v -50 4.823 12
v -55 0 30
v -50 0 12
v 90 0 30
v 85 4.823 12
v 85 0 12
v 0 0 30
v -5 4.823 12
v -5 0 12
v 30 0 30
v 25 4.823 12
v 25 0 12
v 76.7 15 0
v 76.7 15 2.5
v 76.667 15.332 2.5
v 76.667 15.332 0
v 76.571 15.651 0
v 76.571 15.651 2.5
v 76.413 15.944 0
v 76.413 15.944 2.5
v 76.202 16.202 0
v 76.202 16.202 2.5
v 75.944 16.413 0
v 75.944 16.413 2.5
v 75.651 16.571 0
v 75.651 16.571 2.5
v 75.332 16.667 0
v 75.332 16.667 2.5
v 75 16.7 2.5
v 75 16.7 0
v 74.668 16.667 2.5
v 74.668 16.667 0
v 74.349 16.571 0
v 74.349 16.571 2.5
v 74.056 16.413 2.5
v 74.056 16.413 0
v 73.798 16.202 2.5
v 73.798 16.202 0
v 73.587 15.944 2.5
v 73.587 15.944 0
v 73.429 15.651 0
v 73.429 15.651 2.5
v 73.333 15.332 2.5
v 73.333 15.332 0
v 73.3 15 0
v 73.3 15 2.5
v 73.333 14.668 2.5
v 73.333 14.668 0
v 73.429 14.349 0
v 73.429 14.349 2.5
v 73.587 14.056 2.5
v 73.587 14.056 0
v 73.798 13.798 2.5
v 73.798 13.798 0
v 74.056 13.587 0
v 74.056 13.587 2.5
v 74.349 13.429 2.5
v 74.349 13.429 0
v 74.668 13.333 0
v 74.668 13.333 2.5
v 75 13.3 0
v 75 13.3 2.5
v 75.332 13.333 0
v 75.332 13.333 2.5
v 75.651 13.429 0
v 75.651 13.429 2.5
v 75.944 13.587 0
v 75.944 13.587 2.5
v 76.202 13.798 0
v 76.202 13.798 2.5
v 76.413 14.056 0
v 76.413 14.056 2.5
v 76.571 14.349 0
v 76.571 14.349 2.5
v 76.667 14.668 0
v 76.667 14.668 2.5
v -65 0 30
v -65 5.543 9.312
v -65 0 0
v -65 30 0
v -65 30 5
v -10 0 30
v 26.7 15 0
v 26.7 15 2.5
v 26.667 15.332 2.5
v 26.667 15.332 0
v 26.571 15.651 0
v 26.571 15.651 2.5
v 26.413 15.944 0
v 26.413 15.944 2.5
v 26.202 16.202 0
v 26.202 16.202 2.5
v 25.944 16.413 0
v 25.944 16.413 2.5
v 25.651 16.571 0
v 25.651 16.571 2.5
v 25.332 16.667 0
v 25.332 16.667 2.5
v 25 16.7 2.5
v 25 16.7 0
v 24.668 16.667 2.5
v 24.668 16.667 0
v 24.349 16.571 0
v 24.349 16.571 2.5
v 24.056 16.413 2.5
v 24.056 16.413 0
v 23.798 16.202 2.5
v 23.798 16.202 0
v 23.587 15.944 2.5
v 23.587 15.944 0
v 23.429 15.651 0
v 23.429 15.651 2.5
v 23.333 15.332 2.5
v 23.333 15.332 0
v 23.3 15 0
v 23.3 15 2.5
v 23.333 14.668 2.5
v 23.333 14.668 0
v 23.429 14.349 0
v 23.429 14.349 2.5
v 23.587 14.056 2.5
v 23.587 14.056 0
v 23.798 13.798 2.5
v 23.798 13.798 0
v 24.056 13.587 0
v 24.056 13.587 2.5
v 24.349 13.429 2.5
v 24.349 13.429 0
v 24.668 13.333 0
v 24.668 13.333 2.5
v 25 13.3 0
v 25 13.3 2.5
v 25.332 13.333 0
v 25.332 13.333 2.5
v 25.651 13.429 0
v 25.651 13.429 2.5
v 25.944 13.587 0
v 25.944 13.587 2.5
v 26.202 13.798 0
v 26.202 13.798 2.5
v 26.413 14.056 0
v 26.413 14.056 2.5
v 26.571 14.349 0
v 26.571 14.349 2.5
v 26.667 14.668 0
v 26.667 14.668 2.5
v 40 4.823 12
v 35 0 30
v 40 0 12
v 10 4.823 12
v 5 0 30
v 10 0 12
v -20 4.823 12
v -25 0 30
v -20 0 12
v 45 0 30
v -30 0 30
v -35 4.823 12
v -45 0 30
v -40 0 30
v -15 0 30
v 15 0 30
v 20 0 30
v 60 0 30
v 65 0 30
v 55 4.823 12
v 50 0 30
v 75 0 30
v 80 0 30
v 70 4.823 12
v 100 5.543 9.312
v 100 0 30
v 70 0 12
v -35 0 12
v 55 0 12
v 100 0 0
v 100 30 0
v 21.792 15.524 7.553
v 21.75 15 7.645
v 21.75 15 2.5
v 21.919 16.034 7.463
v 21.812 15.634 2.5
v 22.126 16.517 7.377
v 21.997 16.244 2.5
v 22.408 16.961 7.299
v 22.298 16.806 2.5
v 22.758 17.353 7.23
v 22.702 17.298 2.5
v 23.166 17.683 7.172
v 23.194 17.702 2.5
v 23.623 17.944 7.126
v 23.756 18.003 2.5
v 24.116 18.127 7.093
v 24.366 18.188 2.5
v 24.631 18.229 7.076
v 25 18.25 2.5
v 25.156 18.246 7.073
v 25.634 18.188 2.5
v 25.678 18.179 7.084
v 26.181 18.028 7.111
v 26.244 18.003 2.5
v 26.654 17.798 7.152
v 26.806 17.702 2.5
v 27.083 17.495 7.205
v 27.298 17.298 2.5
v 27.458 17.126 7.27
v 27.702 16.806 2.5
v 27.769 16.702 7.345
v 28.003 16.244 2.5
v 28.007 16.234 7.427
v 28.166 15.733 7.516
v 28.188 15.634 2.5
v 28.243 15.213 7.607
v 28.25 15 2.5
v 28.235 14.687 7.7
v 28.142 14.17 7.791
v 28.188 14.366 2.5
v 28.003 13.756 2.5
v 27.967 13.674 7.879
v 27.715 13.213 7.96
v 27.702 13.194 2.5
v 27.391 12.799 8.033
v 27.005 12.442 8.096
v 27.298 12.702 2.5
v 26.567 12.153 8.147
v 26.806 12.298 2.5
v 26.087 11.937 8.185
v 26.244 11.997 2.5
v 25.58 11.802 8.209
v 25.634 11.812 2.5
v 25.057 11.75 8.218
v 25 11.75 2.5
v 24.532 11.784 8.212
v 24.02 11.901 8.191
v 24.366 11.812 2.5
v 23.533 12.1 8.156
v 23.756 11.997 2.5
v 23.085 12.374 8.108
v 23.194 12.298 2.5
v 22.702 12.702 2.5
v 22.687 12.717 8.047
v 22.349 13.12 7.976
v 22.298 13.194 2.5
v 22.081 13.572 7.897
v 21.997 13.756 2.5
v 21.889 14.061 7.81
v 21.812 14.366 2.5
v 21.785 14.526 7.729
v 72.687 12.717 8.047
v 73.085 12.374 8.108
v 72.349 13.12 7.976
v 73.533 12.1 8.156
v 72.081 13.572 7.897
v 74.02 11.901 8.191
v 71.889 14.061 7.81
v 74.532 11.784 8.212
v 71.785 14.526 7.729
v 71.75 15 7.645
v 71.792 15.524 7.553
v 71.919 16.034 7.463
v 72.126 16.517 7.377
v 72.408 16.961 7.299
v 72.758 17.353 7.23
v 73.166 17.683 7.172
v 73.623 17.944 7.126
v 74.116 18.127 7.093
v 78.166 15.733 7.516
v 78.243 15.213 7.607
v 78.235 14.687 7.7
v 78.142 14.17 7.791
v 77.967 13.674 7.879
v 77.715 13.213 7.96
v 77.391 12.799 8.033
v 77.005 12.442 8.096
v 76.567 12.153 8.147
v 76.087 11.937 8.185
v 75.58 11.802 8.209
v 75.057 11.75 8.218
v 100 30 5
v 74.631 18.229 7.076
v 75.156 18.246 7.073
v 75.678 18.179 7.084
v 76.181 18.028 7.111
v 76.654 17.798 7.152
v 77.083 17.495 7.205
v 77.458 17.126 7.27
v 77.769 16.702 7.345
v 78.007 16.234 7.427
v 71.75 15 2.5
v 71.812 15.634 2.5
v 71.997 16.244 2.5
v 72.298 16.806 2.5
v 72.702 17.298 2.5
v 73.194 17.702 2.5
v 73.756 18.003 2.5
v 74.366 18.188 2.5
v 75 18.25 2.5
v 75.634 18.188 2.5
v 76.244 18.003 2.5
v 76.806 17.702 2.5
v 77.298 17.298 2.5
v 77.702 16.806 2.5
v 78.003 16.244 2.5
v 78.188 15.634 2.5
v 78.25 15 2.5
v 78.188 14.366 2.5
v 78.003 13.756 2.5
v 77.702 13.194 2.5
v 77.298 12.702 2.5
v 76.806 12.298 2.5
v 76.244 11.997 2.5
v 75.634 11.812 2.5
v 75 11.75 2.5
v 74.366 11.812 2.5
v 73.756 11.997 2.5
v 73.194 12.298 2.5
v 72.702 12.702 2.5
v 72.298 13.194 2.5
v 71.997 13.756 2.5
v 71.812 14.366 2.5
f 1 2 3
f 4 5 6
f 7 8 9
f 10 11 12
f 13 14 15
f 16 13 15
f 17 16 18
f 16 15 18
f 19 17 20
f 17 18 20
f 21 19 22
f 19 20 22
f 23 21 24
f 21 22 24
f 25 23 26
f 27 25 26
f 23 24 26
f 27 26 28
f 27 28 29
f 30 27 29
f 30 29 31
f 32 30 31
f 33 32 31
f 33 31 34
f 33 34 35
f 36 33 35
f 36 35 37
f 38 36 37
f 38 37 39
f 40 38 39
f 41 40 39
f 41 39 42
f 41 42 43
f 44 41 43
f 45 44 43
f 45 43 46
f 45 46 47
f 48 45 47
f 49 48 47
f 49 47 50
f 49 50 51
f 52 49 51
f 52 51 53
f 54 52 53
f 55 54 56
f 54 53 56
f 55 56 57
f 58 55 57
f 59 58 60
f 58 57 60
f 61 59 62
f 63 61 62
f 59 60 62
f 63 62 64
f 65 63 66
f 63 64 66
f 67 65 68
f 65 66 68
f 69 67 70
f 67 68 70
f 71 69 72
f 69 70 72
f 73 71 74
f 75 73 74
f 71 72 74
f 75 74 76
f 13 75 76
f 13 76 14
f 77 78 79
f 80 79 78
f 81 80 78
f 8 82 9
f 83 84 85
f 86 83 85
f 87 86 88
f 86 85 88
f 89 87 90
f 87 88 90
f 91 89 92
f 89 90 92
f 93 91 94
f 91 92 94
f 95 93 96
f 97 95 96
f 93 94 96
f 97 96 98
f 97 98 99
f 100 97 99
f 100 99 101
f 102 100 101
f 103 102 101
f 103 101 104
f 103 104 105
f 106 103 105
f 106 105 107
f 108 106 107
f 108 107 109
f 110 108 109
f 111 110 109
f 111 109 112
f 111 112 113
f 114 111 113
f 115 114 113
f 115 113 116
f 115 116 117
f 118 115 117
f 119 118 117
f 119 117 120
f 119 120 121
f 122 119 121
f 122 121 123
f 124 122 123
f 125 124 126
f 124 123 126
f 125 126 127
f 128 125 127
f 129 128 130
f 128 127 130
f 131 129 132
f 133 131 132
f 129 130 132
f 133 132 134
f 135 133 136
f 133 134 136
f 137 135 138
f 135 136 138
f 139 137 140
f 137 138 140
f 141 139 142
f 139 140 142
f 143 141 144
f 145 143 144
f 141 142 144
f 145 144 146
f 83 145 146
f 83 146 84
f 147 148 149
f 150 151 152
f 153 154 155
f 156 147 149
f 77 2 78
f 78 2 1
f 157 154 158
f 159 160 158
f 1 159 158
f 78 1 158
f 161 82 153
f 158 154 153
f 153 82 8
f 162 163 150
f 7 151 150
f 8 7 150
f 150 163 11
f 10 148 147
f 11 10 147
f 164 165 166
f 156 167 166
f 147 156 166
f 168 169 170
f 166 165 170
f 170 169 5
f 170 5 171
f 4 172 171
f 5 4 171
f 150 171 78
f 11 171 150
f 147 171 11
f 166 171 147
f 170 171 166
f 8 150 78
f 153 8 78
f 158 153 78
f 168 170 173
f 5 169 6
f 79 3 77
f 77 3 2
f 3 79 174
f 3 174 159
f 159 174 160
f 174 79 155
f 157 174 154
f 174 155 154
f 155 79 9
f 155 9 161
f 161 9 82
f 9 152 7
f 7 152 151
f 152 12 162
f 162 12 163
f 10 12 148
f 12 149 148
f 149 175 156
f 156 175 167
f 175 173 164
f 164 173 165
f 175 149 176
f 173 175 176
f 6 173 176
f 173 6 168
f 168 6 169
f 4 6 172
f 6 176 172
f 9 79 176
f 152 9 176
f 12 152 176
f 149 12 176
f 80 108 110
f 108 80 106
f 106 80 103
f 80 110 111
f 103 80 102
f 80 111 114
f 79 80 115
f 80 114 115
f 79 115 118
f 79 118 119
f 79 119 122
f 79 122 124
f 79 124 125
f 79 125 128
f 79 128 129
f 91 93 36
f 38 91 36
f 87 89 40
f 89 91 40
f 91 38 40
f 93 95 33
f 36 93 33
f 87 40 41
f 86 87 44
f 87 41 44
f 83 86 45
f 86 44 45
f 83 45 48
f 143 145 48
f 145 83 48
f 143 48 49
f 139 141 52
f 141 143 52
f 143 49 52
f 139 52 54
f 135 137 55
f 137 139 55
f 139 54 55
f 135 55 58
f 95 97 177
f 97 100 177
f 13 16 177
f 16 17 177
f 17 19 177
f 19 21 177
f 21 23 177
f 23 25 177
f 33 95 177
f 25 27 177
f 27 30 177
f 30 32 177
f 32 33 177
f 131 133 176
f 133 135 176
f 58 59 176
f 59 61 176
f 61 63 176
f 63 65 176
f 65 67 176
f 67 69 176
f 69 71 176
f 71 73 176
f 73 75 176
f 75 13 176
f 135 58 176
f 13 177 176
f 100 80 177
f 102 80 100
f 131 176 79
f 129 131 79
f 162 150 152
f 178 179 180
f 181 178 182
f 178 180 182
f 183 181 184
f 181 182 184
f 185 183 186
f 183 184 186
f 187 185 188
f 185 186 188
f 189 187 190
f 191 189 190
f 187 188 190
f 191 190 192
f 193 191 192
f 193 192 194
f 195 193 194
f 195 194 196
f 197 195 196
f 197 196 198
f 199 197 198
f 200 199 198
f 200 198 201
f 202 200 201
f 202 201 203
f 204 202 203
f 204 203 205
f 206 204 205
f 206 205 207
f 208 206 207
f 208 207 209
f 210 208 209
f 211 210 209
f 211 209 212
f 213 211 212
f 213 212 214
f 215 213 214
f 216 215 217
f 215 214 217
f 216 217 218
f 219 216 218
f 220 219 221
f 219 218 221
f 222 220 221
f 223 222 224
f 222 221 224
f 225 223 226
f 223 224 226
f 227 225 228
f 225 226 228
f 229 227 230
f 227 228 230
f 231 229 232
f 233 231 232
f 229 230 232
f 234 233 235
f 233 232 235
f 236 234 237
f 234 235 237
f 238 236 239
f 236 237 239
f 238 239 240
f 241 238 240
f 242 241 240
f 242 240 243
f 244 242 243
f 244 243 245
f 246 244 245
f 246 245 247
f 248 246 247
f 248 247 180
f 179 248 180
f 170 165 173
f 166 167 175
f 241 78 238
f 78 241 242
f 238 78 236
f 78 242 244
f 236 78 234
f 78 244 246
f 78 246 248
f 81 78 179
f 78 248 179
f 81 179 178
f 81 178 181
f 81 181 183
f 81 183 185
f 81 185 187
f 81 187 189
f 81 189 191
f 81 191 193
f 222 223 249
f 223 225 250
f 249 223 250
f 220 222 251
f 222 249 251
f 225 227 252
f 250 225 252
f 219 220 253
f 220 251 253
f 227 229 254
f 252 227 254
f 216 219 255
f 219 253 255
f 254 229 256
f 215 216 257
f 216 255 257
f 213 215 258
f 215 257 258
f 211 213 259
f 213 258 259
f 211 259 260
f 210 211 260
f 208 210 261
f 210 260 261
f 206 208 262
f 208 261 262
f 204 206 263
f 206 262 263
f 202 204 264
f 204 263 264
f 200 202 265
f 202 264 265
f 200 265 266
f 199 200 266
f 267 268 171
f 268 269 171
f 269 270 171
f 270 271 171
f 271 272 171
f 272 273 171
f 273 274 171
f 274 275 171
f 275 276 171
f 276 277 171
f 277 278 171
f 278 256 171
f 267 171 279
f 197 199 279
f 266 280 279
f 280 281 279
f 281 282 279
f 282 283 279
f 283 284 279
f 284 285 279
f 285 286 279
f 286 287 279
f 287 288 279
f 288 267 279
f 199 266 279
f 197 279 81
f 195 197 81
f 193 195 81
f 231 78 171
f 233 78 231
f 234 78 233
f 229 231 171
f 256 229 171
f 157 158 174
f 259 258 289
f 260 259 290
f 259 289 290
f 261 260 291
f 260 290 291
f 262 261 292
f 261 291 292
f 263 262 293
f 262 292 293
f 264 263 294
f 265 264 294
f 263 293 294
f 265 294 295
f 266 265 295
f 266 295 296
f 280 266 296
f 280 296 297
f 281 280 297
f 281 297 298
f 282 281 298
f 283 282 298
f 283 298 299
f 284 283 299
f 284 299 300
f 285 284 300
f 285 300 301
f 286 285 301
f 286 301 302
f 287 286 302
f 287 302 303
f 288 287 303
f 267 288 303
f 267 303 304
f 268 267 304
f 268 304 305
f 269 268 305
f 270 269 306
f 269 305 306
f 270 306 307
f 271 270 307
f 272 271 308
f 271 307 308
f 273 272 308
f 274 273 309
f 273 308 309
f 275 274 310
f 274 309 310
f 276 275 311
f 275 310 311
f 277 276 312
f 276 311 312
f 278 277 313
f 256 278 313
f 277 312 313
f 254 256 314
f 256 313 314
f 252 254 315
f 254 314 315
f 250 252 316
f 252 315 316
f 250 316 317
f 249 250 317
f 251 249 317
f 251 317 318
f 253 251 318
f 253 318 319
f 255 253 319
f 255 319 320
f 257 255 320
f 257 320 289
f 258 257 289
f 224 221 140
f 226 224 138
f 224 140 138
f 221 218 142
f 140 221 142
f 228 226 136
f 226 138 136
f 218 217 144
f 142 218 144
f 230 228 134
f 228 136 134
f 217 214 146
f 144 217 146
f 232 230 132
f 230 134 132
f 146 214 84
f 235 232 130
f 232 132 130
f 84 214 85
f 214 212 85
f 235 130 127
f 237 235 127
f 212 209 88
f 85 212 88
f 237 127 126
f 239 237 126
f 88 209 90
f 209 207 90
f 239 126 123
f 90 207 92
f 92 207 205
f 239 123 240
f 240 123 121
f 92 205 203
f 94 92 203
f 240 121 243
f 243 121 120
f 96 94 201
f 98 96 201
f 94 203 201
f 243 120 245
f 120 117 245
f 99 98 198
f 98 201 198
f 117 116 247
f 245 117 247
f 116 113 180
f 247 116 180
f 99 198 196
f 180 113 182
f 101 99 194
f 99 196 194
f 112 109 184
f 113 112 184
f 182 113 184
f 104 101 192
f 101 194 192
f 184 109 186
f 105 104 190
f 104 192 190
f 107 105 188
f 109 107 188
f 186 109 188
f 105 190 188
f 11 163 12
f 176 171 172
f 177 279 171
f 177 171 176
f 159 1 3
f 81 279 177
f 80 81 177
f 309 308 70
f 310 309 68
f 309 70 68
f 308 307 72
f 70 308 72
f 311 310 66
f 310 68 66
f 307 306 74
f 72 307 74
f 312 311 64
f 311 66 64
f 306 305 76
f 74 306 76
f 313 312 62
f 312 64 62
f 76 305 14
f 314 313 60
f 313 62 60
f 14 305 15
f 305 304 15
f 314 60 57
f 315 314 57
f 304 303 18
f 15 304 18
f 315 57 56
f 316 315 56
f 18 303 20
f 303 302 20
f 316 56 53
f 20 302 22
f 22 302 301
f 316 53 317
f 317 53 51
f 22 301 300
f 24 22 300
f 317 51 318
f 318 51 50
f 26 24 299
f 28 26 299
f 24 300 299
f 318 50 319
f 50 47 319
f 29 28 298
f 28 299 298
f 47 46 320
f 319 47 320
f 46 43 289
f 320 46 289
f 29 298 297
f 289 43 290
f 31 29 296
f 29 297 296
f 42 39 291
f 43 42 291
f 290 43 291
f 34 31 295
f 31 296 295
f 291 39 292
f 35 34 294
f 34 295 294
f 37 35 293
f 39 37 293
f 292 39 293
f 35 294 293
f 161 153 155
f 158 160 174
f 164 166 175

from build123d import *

# Parameters (mm, degrees)
BOSS_EXTRUDE1_DEPTH  = 100
M3_CLEARANCE_HOLE1_D = 3.4
SKETCH4_R            = 3.25
CUT_EXTRUDE1_DEPTH   = 108.964114408
BOSS_EXTRUDE2_DEPTH  = 65
CUT_EXTRUDE2_DEPTH   = 109.627804912
LPATTERN1_COUNT      = 10
LPATTERN1_PITCH      = 15


with BuildPart() as part:
    # Sketch1 → Boss-Extrude1 (new body)
    with BuildSketch(Plane(origin=(0, 0, 0), x_dir=(0, 0, -1), z_dir=(1, 0, 0))):
        Polygon((0, 0), (0, 30), (-5, 30), (-9.312388631, 5.54322876), (-30, 0), align=None)
    extrude(amount=BOSS_EXTRUDE1_DEPTH)

    # M3 Clearance Hole1 (through all)
    with Locations(Plane(origin=(0, 0, 0), x_dir=(-1, 0, 0), z_dir=(0, 0, -1))):
        with Locations((-25, 15), (-75, 15)):
            Hole(M3_CLEARANCE_HOLE1_D / 2)

    # Sketch4 → Cut-Extrude1 (cut, through all)
    with BuildSketch(Plane(origin=(0, 0, 2.5), x_dir=(-1, 0, 0), z_dir=(0, 0, -1))):
        with Locations((-75, 15)):
            Circle(SKETCH4_R)
        with Locations((-25, 15)):
            Circle(SKETCH4_R)
    extrude(amount=-CUT_EXTRUDE1_DEPTH, mode=Mode.SUBTRACT)

    # Sketch6 → Boss-Extrude2 (add)
    with BuildSketch(Plane.ZY):
        Polygon((0, 0), (30, 0), (9.312388631, 5.54322876), (5, 30), (0, 30), align=None)
    extrude(amount=BOSS_EXTRUDE2_DEPTH)

    # Sketch7 → Cut-Extrude2 (cut, symmetric)
    with BuildSketch(Plane(origin=(0, 0, 0), x_dir=(1, 0, 0), z_dir=(0, 1, 0))):
        Polygon((-55, -30), (-50, -12), (-45, -30), align=None)
    cut_extrude2 = extrude(amount=CUT_EXTRUDE2_DEPTH, both=True, mode=Mode.SUBTRACT)

    # LPattern1: Cut-Extrude2 ×10
    with Locations(*[(i * LPATTERN1_PITCH, 0, 0) for i in range(1, LPATTERN1_COUNT)]):
        add(cut_extrude2, mode=Mode.SUBTRACT)


solid = part.part
